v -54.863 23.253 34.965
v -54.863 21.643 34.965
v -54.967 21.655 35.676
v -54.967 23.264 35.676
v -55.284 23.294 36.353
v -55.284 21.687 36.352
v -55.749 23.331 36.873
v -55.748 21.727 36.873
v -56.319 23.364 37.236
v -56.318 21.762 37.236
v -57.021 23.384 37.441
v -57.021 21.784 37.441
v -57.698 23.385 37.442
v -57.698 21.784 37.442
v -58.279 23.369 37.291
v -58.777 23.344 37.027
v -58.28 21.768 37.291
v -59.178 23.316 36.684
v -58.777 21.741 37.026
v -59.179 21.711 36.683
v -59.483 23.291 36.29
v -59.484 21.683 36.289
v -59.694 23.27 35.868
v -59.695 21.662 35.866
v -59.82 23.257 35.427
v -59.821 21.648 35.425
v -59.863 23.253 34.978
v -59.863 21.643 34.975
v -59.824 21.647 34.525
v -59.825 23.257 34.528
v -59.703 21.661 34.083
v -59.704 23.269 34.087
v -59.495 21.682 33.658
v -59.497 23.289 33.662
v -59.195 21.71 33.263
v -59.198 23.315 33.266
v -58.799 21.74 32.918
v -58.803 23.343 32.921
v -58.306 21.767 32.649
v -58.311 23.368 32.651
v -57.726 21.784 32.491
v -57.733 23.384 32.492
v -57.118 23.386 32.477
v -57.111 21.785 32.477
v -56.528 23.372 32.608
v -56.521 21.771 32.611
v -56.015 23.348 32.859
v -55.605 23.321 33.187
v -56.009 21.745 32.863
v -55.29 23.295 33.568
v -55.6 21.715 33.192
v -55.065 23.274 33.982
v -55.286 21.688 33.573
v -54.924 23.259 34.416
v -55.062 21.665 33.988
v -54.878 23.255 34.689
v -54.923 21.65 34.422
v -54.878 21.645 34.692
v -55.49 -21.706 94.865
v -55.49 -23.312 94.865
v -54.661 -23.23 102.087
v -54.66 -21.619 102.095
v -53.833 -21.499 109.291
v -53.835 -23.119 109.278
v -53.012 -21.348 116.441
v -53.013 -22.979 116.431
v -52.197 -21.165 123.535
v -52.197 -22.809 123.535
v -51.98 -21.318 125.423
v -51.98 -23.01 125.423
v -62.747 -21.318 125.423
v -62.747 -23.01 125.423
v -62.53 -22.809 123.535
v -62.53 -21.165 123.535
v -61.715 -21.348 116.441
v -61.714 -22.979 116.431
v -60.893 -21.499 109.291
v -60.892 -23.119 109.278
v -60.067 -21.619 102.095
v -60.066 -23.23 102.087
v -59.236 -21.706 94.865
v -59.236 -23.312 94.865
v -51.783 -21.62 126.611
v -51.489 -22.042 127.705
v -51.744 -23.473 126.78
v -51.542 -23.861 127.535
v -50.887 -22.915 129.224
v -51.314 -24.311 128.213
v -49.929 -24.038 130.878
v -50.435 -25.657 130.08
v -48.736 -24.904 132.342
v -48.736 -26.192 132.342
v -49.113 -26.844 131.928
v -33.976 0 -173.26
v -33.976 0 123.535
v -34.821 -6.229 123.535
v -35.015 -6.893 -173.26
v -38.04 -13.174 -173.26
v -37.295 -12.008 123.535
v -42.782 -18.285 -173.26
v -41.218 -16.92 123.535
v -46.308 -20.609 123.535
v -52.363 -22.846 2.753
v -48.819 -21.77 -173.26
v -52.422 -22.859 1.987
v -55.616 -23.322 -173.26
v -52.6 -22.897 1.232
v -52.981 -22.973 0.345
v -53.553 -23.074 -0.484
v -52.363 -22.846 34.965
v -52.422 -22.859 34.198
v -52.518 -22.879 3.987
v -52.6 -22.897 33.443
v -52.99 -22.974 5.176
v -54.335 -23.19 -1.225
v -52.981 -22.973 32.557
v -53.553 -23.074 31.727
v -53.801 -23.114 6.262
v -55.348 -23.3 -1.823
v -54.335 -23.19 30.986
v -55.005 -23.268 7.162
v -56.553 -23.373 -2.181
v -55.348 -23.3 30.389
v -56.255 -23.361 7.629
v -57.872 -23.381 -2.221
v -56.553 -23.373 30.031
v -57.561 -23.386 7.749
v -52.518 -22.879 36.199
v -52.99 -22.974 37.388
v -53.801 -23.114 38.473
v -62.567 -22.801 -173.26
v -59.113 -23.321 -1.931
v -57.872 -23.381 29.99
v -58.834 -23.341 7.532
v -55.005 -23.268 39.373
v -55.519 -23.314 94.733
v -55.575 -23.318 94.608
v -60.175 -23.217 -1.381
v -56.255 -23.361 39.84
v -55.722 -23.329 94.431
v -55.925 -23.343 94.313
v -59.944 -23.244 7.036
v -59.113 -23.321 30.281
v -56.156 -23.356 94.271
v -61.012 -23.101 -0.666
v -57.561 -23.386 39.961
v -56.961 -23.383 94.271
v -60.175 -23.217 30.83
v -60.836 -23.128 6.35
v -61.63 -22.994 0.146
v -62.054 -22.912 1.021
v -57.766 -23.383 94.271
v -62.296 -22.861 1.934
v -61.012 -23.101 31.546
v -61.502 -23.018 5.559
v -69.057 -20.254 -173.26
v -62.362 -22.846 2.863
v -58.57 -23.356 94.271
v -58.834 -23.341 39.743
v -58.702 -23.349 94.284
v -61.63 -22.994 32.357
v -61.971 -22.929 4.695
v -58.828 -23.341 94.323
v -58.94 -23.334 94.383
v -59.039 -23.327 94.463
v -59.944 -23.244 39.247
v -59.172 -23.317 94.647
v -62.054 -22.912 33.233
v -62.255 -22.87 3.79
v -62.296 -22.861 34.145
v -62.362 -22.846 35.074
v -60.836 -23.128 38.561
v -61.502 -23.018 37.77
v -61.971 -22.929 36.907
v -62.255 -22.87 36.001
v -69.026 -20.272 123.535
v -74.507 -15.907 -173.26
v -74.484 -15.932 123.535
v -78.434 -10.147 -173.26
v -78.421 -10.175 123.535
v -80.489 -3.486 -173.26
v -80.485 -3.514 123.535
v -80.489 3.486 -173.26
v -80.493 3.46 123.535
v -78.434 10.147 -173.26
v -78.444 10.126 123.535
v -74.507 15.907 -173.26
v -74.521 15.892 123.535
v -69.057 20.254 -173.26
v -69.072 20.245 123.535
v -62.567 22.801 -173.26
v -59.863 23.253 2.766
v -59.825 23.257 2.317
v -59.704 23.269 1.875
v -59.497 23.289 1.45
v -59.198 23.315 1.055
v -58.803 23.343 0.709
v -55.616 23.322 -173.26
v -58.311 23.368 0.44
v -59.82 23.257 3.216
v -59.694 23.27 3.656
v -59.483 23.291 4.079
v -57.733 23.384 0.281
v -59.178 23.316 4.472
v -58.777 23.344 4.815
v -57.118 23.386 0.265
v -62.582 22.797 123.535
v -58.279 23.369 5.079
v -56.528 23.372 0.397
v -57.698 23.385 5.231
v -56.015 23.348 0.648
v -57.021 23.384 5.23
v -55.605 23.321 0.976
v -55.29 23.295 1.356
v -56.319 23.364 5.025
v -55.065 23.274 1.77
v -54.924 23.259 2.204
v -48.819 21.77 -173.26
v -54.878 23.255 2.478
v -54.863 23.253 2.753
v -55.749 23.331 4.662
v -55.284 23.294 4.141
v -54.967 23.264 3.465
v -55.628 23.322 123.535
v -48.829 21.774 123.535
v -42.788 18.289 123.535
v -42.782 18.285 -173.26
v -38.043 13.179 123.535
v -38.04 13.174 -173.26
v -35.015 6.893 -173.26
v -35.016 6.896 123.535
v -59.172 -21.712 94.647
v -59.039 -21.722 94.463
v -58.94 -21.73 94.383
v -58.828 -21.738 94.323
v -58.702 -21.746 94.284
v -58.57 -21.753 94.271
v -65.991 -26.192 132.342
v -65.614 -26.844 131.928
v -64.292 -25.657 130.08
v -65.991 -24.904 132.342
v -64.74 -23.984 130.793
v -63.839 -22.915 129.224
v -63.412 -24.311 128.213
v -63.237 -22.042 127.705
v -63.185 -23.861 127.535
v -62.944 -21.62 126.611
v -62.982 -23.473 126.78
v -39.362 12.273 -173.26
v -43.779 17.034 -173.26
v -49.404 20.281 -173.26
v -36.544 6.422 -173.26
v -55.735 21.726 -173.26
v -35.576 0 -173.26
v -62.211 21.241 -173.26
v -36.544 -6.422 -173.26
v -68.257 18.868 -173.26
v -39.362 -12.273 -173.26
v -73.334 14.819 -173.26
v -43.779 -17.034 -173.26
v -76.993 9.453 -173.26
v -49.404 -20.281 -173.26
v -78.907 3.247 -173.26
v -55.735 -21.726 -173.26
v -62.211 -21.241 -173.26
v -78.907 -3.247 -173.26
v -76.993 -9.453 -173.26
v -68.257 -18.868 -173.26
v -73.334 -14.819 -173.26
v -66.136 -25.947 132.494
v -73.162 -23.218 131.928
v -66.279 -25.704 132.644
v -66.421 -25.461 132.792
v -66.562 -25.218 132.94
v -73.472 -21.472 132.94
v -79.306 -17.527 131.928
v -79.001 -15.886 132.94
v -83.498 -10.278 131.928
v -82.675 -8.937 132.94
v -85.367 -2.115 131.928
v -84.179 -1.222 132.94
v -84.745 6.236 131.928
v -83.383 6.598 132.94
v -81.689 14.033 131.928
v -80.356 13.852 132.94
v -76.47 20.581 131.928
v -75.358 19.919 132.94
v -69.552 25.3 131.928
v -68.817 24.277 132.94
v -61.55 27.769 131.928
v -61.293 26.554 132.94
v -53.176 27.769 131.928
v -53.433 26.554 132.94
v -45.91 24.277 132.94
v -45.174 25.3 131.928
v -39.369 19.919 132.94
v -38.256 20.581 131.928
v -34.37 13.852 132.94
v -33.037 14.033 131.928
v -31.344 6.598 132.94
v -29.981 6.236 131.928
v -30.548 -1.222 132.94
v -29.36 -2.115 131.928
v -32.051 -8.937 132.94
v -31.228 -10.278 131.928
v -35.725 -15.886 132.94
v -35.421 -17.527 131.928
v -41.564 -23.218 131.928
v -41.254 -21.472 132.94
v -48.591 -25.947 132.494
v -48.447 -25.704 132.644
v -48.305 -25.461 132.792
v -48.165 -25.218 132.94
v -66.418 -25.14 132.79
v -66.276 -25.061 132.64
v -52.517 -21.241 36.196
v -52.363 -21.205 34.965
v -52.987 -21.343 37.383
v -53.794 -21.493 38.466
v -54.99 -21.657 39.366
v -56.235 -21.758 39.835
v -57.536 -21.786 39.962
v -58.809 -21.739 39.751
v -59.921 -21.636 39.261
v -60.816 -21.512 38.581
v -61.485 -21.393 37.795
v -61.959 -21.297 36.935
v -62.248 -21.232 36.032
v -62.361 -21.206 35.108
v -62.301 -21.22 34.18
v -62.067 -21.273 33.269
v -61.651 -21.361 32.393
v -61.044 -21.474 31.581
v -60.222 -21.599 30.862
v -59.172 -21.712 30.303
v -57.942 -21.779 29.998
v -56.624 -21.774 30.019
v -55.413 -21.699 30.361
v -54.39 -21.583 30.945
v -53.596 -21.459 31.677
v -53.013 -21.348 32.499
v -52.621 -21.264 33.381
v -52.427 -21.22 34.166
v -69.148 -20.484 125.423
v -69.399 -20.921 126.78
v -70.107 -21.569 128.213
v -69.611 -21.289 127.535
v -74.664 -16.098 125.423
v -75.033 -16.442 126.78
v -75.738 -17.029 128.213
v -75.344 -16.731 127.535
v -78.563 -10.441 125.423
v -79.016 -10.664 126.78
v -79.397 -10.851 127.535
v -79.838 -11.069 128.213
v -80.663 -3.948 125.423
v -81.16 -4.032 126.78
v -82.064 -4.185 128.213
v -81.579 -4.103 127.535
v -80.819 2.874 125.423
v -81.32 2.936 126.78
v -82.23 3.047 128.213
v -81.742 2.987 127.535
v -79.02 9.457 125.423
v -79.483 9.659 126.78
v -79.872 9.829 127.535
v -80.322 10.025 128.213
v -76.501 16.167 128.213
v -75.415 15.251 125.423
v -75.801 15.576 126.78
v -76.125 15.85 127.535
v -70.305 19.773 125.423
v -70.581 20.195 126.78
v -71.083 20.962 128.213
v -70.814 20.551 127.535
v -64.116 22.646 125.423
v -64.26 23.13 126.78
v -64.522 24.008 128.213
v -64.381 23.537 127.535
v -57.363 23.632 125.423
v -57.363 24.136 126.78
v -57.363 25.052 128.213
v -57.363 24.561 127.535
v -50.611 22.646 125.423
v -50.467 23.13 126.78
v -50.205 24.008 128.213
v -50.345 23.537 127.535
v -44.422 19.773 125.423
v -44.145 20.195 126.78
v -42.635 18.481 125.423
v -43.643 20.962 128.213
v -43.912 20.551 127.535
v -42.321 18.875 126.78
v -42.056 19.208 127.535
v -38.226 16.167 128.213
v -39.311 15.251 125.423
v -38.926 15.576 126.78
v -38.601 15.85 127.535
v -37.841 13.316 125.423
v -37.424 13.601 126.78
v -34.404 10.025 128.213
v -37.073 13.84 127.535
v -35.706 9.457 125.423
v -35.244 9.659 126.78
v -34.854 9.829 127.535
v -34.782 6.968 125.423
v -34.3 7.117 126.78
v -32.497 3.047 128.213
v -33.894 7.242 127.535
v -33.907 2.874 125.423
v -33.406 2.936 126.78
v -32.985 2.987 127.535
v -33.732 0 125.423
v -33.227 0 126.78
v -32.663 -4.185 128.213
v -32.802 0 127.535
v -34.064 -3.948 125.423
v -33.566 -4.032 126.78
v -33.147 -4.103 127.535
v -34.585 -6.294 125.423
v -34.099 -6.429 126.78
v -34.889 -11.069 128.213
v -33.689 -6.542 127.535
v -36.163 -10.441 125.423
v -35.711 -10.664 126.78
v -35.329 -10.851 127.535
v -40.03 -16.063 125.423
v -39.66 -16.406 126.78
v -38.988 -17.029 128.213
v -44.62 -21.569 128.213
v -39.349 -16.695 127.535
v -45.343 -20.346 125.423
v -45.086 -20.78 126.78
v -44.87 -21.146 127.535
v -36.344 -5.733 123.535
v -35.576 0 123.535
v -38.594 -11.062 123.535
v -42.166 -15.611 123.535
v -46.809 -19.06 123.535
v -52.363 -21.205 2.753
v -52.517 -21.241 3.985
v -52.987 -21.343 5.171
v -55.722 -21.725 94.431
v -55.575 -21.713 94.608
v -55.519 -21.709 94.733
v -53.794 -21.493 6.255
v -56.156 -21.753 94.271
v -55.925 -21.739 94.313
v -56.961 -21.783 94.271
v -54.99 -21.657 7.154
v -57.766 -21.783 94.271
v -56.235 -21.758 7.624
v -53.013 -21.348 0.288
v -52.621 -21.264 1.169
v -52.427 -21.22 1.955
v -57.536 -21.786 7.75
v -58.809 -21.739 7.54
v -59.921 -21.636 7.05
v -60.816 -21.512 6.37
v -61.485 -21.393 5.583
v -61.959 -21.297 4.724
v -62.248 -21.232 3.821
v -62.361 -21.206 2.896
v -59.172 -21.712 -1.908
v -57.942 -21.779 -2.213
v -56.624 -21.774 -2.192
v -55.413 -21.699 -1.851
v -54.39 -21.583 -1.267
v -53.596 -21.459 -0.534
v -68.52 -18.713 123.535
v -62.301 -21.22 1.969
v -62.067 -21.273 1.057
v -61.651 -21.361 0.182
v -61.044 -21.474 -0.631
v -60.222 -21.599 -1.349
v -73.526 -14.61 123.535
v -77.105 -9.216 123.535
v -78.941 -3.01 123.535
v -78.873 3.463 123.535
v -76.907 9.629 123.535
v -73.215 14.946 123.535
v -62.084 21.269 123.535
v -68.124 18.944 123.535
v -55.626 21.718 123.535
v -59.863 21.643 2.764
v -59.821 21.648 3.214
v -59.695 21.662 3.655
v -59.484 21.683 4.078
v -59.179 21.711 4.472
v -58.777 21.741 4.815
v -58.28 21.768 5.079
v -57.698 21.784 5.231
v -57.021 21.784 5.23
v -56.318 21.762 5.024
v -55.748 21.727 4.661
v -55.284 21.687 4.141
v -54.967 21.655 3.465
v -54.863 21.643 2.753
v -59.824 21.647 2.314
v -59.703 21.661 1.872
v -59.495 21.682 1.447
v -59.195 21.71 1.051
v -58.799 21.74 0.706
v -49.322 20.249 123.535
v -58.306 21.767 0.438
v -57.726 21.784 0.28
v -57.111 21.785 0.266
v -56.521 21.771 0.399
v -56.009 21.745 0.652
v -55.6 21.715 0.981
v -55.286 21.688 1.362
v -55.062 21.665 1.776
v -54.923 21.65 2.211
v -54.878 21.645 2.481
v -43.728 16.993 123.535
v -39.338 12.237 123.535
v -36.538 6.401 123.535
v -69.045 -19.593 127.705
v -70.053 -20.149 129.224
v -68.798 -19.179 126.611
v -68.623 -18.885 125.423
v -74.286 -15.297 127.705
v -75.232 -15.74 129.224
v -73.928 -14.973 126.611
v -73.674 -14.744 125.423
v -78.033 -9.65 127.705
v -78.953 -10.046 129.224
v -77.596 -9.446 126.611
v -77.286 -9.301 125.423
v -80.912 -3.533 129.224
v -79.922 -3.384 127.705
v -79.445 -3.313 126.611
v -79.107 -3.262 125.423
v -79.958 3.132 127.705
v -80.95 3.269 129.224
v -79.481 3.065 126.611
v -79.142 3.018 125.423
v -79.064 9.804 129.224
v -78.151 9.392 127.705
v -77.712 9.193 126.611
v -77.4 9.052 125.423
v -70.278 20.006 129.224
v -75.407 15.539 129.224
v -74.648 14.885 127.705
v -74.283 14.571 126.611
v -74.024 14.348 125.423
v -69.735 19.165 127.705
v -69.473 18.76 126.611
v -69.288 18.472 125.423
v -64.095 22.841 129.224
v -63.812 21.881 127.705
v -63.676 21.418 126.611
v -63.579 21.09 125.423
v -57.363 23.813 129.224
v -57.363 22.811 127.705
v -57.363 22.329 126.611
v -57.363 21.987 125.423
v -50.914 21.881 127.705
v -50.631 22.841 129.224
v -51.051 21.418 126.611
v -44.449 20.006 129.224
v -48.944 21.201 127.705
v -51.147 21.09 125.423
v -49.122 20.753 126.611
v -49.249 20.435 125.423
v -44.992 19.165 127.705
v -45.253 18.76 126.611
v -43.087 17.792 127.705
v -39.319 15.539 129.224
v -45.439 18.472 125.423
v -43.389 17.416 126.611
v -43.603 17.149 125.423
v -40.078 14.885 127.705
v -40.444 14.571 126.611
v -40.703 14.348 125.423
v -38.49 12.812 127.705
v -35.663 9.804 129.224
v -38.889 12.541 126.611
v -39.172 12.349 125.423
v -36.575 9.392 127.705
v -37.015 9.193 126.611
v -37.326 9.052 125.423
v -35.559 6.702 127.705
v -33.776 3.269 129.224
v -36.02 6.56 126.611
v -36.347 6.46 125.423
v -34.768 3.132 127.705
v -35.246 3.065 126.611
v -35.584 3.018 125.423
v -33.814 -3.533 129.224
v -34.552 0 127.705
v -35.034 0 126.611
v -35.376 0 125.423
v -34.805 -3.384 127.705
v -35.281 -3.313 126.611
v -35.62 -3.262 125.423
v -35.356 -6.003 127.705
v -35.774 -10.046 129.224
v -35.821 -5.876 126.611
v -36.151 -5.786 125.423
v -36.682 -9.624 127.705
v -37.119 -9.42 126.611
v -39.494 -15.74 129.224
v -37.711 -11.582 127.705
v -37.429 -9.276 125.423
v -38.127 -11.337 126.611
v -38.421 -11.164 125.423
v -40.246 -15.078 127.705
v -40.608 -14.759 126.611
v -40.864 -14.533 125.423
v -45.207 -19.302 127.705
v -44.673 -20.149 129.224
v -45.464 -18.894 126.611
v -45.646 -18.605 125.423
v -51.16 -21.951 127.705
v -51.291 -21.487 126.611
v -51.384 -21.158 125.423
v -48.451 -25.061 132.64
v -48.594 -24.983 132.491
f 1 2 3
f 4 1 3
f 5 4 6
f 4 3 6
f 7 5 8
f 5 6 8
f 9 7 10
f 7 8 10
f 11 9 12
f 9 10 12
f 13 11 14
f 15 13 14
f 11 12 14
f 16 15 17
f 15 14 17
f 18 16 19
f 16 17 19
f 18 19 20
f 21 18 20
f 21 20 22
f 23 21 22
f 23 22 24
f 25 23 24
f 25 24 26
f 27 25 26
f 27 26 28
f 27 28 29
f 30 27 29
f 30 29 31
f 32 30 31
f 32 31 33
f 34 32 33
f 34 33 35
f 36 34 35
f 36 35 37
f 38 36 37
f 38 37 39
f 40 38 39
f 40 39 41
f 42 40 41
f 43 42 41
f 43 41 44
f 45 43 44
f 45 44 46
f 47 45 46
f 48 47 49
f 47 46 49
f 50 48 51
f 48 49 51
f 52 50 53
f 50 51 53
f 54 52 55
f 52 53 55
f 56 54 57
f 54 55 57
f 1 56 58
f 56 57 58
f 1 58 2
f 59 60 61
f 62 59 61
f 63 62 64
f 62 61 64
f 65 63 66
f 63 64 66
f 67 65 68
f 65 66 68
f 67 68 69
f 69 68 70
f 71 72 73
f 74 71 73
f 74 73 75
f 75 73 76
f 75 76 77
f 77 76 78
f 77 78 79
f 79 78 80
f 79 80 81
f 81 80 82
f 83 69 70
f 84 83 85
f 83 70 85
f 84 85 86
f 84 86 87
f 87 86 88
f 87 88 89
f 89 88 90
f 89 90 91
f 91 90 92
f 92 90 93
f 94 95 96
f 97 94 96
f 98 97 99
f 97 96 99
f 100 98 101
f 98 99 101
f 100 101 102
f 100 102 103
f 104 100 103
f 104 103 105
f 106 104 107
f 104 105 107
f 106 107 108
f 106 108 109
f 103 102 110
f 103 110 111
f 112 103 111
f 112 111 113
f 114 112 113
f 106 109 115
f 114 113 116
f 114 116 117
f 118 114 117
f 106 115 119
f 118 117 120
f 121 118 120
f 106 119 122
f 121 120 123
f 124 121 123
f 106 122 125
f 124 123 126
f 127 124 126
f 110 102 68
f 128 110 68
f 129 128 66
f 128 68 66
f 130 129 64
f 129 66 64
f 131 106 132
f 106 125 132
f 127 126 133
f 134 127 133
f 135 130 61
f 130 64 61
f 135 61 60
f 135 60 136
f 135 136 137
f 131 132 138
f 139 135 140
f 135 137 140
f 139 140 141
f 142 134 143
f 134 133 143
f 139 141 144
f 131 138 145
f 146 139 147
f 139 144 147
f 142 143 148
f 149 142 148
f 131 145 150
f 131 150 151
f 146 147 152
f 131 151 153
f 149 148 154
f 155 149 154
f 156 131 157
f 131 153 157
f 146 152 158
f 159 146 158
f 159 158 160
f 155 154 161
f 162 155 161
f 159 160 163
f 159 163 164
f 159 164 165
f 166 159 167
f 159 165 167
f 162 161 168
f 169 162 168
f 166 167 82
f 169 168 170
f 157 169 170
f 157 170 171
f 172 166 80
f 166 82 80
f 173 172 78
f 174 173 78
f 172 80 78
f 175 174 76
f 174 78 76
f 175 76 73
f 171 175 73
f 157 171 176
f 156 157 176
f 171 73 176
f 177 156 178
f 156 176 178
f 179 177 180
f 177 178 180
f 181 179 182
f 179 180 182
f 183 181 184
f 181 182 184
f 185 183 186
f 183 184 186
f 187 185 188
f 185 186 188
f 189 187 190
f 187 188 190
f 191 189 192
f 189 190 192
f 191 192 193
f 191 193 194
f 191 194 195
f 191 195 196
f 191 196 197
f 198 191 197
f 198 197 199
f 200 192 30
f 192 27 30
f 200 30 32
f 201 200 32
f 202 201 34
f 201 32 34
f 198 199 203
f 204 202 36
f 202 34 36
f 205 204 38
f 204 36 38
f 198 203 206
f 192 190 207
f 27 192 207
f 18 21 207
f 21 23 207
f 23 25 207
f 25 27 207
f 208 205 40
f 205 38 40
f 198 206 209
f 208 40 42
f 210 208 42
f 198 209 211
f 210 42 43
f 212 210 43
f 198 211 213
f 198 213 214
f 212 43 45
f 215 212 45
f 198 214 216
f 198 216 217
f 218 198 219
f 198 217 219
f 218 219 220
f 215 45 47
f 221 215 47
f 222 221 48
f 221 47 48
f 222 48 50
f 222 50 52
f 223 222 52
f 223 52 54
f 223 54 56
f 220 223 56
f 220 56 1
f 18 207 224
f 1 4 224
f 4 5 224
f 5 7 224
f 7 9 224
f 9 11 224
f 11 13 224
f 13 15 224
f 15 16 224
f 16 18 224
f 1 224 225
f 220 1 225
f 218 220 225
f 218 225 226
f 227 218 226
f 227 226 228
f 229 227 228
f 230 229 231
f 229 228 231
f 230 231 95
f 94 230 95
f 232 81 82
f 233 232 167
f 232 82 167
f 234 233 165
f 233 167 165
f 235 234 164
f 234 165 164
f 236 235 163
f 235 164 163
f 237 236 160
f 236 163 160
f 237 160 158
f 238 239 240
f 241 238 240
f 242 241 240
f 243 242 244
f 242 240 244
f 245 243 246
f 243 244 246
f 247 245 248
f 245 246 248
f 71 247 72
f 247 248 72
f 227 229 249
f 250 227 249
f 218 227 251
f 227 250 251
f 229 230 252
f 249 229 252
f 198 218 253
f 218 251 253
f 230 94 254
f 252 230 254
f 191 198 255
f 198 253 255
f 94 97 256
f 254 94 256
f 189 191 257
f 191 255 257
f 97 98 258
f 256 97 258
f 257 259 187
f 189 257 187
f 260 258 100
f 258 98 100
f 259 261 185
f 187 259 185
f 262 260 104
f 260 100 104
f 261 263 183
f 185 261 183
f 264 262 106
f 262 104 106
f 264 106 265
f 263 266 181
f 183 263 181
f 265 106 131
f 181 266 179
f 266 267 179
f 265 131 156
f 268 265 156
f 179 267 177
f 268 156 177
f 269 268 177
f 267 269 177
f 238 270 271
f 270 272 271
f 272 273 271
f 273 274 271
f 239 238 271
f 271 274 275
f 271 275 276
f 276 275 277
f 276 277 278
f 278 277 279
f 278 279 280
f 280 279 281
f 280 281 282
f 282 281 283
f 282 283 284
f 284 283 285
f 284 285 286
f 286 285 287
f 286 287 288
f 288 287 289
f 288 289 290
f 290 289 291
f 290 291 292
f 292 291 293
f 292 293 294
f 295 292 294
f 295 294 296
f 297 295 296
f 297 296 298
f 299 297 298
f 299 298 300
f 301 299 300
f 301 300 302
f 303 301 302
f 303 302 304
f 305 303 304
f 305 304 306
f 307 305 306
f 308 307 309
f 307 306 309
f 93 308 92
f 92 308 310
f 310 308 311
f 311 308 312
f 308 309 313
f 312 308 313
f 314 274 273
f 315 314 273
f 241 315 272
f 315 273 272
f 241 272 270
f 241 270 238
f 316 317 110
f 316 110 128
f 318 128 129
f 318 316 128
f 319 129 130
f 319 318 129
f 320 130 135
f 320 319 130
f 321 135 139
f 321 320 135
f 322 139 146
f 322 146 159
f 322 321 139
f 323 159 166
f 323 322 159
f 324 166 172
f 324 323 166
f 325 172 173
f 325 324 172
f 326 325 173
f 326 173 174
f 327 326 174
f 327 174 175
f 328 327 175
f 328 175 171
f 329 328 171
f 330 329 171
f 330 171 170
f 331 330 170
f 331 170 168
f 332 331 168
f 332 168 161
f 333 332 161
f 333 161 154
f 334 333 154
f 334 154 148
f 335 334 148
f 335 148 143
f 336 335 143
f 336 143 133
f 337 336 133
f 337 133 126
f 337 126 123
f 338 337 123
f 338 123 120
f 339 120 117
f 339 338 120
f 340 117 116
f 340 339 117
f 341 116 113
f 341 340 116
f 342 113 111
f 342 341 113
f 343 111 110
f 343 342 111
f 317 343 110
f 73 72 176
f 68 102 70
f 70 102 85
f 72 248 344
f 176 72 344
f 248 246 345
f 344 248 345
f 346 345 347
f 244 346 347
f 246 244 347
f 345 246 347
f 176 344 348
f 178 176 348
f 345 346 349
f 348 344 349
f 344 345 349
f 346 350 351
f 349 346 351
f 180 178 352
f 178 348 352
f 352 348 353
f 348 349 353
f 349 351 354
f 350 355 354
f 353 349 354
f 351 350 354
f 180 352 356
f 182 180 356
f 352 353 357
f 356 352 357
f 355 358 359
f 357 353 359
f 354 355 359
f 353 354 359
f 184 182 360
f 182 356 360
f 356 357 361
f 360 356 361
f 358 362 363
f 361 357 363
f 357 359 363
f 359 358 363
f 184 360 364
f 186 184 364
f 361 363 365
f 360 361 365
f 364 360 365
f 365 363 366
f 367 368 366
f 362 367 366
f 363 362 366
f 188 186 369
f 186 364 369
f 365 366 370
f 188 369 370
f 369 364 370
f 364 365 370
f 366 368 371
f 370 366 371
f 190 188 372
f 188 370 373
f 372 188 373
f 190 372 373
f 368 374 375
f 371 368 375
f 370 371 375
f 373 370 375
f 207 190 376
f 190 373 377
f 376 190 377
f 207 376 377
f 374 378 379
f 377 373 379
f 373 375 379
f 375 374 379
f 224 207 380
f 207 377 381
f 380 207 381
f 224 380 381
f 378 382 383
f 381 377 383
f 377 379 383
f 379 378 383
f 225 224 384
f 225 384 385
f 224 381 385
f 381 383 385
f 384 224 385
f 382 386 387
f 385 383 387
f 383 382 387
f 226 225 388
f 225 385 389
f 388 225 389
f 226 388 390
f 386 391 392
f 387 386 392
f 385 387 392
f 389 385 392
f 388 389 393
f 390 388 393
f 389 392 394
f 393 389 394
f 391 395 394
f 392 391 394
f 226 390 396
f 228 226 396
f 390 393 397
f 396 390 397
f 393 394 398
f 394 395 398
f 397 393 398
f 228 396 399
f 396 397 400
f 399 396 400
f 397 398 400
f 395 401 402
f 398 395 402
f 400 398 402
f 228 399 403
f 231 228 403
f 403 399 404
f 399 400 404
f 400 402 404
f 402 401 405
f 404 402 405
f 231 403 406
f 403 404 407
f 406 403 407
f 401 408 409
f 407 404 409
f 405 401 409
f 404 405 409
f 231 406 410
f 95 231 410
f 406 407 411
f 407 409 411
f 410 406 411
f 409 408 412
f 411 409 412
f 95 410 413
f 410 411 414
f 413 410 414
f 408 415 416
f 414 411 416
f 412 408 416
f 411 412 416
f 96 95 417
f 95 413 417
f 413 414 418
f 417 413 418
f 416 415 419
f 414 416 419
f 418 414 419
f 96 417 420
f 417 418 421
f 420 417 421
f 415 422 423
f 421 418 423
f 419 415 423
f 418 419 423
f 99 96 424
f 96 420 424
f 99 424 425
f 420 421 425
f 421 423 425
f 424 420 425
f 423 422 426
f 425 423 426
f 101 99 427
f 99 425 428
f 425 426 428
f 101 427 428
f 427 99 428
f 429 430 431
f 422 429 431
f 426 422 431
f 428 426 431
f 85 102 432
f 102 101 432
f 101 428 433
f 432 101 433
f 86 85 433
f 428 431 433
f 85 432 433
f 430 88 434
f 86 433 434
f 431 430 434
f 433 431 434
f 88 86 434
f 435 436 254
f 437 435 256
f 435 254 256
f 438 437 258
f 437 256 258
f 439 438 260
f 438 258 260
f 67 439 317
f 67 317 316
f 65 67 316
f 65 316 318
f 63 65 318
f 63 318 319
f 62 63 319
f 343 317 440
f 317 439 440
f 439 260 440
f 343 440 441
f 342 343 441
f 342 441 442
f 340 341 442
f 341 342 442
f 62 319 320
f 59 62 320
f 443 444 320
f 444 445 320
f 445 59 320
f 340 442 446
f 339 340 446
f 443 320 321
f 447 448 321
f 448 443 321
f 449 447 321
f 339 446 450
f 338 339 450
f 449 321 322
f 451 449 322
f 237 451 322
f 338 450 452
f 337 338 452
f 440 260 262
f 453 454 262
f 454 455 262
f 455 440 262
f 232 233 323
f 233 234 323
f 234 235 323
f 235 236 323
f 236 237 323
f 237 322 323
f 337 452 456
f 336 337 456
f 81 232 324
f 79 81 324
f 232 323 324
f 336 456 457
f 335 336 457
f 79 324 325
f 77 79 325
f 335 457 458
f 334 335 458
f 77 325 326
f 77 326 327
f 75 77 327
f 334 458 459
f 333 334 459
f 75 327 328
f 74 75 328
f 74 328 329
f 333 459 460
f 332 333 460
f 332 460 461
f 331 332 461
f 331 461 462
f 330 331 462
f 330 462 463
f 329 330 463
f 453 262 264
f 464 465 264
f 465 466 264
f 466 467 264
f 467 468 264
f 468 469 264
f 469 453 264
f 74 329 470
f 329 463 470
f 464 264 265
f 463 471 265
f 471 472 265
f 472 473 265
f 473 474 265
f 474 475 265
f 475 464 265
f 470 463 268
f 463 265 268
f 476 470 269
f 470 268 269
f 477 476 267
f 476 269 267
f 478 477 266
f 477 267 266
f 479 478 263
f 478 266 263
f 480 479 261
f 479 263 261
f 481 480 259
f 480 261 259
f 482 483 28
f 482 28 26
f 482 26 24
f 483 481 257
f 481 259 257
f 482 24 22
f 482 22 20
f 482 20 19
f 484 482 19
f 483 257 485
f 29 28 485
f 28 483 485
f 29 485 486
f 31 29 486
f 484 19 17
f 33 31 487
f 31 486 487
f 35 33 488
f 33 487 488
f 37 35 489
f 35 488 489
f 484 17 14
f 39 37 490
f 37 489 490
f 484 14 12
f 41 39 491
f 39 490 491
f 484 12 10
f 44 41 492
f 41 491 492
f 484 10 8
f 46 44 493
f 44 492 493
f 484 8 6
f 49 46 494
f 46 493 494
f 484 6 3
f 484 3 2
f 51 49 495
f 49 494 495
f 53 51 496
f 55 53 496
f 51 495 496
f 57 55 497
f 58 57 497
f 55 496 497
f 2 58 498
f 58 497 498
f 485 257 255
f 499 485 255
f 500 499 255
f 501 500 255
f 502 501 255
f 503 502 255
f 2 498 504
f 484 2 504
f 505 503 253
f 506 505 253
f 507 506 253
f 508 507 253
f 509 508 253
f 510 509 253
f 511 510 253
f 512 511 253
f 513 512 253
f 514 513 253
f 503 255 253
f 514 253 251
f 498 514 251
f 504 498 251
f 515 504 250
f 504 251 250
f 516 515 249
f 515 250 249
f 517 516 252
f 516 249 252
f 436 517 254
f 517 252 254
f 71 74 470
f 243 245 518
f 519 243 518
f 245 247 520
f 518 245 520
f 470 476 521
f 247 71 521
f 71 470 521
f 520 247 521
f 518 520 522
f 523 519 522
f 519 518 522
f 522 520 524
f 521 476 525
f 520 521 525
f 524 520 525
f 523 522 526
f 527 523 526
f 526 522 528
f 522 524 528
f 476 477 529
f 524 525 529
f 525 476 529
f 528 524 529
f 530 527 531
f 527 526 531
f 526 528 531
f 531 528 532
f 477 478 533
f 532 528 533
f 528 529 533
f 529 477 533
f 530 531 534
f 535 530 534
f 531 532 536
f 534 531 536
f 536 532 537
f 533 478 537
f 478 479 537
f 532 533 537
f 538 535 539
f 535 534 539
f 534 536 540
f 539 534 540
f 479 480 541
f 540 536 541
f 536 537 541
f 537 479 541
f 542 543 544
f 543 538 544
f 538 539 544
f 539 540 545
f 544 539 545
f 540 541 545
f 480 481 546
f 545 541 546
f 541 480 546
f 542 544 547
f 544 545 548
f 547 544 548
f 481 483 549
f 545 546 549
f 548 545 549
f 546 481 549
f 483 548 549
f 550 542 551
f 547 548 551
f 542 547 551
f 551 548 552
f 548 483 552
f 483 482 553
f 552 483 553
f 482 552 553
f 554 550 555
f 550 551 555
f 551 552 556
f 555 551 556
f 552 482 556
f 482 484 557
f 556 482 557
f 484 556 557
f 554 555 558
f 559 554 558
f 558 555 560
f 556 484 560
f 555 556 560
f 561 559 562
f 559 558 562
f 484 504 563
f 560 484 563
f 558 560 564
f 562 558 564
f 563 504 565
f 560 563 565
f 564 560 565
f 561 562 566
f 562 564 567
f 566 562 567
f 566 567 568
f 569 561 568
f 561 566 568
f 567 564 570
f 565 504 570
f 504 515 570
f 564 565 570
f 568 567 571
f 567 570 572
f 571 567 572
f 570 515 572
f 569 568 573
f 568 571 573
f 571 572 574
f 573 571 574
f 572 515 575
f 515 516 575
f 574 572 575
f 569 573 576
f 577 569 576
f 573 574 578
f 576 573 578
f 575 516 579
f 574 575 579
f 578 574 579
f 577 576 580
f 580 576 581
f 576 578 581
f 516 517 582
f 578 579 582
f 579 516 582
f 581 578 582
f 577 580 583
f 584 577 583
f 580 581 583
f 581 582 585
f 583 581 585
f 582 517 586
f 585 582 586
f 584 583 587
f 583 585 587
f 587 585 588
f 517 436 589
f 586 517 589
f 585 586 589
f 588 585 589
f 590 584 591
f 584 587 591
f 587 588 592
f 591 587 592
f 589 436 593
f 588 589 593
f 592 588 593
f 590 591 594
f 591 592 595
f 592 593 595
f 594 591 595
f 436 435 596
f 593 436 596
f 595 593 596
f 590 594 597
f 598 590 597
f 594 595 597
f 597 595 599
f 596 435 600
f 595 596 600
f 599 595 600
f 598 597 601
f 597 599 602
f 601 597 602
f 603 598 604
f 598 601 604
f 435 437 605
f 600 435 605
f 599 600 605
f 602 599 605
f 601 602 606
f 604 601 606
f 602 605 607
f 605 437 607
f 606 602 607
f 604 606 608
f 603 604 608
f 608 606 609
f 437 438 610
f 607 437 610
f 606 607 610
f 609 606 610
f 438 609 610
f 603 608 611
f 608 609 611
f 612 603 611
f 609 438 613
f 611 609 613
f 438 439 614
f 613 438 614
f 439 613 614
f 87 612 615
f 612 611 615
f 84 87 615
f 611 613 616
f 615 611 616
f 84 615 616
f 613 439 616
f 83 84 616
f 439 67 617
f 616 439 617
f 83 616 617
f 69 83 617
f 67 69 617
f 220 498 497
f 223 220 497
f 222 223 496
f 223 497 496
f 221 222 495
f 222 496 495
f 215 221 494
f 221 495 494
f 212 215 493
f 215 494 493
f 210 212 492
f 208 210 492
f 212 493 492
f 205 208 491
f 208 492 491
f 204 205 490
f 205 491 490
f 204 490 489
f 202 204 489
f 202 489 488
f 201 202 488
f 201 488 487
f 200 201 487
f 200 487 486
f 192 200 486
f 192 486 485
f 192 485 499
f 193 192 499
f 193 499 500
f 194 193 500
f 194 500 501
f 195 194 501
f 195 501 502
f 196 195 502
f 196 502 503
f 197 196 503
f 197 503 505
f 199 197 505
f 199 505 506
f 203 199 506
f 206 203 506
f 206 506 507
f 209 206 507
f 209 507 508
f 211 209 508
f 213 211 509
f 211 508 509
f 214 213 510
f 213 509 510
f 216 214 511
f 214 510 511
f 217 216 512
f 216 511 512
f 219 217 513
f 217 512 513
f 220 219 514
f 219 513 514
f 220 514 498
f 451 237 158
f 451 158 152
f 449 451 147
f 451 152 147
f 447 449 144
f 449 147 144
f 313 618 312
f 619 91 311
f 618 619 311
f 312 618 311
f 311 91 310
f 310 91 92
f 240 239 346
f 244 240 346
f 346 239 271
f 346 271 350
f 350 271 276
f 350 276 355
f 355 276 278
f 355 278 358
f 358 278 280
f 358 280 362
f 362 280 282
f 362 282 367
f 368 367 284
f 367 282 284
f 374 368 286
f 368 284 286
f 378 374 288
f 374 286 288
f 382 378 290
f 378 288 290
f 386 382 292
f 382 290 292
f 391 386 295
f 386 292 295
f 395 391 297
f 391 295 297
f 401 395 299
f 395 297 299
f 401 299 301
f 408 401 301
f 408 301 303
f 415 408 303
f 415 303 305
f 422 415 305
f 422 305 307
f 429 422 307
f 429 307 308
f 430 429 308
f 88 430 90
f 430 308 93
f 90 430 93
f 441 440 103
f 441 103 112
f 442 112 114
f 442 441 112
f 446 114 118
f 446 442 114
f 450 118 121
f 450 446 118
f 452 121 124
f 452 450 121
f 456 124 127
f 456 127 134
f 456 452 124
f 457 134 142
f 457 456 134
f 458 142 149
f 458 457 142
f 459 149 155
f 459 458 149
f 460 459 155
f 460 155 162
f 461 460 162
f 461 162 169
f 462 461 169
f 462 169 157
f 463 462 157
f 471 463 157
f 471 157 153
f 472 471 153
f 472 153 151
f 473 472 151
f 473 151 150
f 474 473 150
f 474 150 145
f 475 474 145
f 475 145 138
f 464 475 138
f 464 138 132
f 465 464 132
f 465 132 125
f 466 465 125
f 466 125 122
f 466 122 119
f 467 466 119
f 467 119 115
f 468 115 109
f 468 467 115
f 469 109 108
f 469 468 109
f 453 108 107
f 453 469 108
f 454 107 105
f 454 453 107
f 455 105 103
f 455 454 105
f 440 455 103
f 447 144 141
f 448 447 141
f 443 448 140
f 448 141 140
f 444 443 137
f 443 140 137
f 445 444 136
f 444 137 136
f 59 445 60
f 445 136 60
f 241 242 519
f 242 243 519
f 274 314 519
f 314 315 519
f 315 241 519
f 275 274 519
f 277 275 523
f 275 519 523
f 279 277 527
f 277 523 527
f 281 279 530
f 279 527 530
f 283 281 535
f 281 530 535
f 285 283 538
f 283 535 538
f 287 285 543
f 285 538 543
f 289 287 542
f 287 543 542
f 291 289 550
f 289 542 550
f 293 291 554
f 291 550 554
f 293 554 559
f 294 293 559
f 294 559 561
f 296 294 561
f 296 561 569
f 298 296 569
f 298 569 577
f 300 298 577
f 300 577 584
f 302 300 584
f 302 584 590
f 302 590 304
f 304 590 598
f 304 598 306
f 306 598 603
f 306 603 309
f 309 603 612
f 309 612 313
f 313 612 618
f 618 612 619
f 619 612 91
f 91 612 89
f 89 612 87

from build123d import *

# Parameters (mm, degrees)
F1_DEPTH      = 45
F3_DEPTH      = 47.5
F0_R          = 5
F0_R_2        = 2.5
F4_DEPTH      = 26.8448911594
F4_DEPTH_BACK = 10.2
F5_DEPTH      = 26.8448911594
F5_DEPTH_BACK = 17.3
F6_DEPTH      = 28.0842064241
F6_DEPTH_BACK = 25
F7_DEPTH      = 40.6
F7_DEPTH_BACK = 127.9
F8_DEPTH      = 26.8448911594
F8_DEPTH_BACK = 25


with BuildPart() as f1:
    # F0 (on Front) → F1 (new body)
    with BuildSketch(Plane.XZ):
        with BuildLine():
            ThreePointArc((-56.1564664539, 94.2714790144), (-55.7103223471, 94.4415023302), (-55.4904903386, 94.8653258548))
            Line((-55.4904903386, 94.8653258548), (-51.9799463815, 125.4227281117))
            ThreePointArc((-51.9799463815, 125.4227281117), (-50.9232927128, 129.1475665325), (-48.7355589867, 132.3420554399))
            Line((-48.7355589867, 132.3420554399), (-47.0069608027, 134.1516260741))
            Line((-47.0069608027, 134.1516260741), (-67.7195905025, 134.1516260741))
            Line((-67.7195905025, 134.1516260741), (-65.9909923185, 132.3420554399))
            ThreePointArc((-65.9909923185, 132.3420554399), (-63.8032585923, 129.1475665325), (-62.7466049237, 125.4227281117))
            Line((-62.7466049237, 125.4227281117), (-59.2360609666, 94.8653258548))
            ThreePointArc((-59.2360609666, 94.8653258548), (-59.0162289581, 94.4415023302), (-58.5700848513, 94.2714790144))
            Line((-58.5700848513, 94.2714790144), (-56.1564664539, 94.2714790144))
        make_face()
    extrude(amount=F1_DEPTH)

    # F0 (on Front) → F2 (revolve)
    with BuildSketch(Plane.XZ):
        with BuildLine():
            ThreePointArc((-33.5507006262, 129.2238042997), (-35.0548504452, 126.5545175576), (-35.5763814669, 123.535318362))
            Line((-35.5763814669, 123.535318362), (-35.5763814669, -173.2597642372))
            Line((-35.5763814669, -173.2597642372), (-33.9763798769, -173.2597642372))
            Line((-33.9763798769, -173.2597642372), (-33.9763798769, 123.535318362))
            ThreePointArc((-33.9763798769, 123.535318362), (-33.5475655735, 126.0177705006), (-32.3108204324, 128.2125169058))
            Line((-32.3108204324, 128.2125169058), (-29.2800693285, 131.9283431772))
            Line((-29.2800693285, 131.9283431772), (-30.5199495223, 132.9396305711))
            Line((-30.5199495223, 132.9396305711), (-33.5507006262, 129.2238042997))
        make_face()
    revolve(axis=Axis((-57.3632756526, 0, 129.4338501955), (0, 0, -1)))

    # F3 (cut): a face of the model
    f3_faces = [f1.faces().sort_by_distance(p)[0] for p in [
        (-57.3632756526, -45, 118.8376306589),
    ]]
    extrude(f3_faces, amount=-F3_DEPTH, mode=Mode.SUBTRACT)

    # F0 (on Front) → F4 (cut, two sides)
    with BuildSketch(Plane.XZ) as f4_sk:
        with Locations((-57.3632756526, 34.9645242095)):
            Circle(F0_R)
        with Locations((-57.3632756526, 34.9645242095)):
            Circle(F0_R_2, mode=Mode.SUBTRACT)
    extrude(amount=F4_DEPTH, mode=Mode.SUBTRACT)
    extrude(f4_sk.sketch, amount=-F4_DEPTH_BACK, mode=Mode.SUBTRACT)

    # F0 (on Front) → F5 (cut, two sides)
    with BuildSketch(Plane.XZ) as f5_sk:
        with Locations((-57.3632756526, 2.7531287633)):
            Circle(F0_R)
        with Locations((-57.3632756526, 2.7531287633)):
            Circle(F0_R_2, mode=Mode.SUBTRACT)
    extrude(amount=F5_DEPTH, mode=Mode.SUBTRACT)
    extrude(f5_sk.sketch, amount=-F5_DEPTH_BACK, mode=Mode.SUBTRACT)

    # F0 (on Front) → F6 (cut, two sides)
    with BuildSketch(Plane.XZ) as f6_sk:
        with Locations((-57.3632756526, 34.9645242095)):
            Circle(F0_R_2)
    extrude(amount=-F6_DEPTH, mode=Mode.SUBTRACT)
    extrude(f6_sk.sketch, amount=F6_DEPTH_BACK, mode=Mode.SUBTRACT)

    # F0 (on Front) → F7 (cut, two sides)
    with BuildSketch(Plane.XZ) as f7_sk:
        with Locations((-57.3632756526, 2.7531287633)):
            Circle(F0_R_2)
    extrude(amount=F7_DEPTH, mode=Mode.SUBTRACT)
    extrude(f7_sk.sketch, amount=-F7_DEPTH_BACK, mode=Mode.SUBTRACT)

    # F0 (on Front) → F8 (cut, two sides)
    with BuildSketch(Plane.XZ) as f8_sk:
        with Locations((-57.3632756526, 34.9645242095)):
            Circle(F0_R_2)
    extrude(amount=F8_DEPTH, mode=Mode.SUBTRACT)
    extrude(f8_sk.sketch, amount=-F8_DEPTH_BACK, mode=Mode.SUBTRACT)


solid = f1.part
